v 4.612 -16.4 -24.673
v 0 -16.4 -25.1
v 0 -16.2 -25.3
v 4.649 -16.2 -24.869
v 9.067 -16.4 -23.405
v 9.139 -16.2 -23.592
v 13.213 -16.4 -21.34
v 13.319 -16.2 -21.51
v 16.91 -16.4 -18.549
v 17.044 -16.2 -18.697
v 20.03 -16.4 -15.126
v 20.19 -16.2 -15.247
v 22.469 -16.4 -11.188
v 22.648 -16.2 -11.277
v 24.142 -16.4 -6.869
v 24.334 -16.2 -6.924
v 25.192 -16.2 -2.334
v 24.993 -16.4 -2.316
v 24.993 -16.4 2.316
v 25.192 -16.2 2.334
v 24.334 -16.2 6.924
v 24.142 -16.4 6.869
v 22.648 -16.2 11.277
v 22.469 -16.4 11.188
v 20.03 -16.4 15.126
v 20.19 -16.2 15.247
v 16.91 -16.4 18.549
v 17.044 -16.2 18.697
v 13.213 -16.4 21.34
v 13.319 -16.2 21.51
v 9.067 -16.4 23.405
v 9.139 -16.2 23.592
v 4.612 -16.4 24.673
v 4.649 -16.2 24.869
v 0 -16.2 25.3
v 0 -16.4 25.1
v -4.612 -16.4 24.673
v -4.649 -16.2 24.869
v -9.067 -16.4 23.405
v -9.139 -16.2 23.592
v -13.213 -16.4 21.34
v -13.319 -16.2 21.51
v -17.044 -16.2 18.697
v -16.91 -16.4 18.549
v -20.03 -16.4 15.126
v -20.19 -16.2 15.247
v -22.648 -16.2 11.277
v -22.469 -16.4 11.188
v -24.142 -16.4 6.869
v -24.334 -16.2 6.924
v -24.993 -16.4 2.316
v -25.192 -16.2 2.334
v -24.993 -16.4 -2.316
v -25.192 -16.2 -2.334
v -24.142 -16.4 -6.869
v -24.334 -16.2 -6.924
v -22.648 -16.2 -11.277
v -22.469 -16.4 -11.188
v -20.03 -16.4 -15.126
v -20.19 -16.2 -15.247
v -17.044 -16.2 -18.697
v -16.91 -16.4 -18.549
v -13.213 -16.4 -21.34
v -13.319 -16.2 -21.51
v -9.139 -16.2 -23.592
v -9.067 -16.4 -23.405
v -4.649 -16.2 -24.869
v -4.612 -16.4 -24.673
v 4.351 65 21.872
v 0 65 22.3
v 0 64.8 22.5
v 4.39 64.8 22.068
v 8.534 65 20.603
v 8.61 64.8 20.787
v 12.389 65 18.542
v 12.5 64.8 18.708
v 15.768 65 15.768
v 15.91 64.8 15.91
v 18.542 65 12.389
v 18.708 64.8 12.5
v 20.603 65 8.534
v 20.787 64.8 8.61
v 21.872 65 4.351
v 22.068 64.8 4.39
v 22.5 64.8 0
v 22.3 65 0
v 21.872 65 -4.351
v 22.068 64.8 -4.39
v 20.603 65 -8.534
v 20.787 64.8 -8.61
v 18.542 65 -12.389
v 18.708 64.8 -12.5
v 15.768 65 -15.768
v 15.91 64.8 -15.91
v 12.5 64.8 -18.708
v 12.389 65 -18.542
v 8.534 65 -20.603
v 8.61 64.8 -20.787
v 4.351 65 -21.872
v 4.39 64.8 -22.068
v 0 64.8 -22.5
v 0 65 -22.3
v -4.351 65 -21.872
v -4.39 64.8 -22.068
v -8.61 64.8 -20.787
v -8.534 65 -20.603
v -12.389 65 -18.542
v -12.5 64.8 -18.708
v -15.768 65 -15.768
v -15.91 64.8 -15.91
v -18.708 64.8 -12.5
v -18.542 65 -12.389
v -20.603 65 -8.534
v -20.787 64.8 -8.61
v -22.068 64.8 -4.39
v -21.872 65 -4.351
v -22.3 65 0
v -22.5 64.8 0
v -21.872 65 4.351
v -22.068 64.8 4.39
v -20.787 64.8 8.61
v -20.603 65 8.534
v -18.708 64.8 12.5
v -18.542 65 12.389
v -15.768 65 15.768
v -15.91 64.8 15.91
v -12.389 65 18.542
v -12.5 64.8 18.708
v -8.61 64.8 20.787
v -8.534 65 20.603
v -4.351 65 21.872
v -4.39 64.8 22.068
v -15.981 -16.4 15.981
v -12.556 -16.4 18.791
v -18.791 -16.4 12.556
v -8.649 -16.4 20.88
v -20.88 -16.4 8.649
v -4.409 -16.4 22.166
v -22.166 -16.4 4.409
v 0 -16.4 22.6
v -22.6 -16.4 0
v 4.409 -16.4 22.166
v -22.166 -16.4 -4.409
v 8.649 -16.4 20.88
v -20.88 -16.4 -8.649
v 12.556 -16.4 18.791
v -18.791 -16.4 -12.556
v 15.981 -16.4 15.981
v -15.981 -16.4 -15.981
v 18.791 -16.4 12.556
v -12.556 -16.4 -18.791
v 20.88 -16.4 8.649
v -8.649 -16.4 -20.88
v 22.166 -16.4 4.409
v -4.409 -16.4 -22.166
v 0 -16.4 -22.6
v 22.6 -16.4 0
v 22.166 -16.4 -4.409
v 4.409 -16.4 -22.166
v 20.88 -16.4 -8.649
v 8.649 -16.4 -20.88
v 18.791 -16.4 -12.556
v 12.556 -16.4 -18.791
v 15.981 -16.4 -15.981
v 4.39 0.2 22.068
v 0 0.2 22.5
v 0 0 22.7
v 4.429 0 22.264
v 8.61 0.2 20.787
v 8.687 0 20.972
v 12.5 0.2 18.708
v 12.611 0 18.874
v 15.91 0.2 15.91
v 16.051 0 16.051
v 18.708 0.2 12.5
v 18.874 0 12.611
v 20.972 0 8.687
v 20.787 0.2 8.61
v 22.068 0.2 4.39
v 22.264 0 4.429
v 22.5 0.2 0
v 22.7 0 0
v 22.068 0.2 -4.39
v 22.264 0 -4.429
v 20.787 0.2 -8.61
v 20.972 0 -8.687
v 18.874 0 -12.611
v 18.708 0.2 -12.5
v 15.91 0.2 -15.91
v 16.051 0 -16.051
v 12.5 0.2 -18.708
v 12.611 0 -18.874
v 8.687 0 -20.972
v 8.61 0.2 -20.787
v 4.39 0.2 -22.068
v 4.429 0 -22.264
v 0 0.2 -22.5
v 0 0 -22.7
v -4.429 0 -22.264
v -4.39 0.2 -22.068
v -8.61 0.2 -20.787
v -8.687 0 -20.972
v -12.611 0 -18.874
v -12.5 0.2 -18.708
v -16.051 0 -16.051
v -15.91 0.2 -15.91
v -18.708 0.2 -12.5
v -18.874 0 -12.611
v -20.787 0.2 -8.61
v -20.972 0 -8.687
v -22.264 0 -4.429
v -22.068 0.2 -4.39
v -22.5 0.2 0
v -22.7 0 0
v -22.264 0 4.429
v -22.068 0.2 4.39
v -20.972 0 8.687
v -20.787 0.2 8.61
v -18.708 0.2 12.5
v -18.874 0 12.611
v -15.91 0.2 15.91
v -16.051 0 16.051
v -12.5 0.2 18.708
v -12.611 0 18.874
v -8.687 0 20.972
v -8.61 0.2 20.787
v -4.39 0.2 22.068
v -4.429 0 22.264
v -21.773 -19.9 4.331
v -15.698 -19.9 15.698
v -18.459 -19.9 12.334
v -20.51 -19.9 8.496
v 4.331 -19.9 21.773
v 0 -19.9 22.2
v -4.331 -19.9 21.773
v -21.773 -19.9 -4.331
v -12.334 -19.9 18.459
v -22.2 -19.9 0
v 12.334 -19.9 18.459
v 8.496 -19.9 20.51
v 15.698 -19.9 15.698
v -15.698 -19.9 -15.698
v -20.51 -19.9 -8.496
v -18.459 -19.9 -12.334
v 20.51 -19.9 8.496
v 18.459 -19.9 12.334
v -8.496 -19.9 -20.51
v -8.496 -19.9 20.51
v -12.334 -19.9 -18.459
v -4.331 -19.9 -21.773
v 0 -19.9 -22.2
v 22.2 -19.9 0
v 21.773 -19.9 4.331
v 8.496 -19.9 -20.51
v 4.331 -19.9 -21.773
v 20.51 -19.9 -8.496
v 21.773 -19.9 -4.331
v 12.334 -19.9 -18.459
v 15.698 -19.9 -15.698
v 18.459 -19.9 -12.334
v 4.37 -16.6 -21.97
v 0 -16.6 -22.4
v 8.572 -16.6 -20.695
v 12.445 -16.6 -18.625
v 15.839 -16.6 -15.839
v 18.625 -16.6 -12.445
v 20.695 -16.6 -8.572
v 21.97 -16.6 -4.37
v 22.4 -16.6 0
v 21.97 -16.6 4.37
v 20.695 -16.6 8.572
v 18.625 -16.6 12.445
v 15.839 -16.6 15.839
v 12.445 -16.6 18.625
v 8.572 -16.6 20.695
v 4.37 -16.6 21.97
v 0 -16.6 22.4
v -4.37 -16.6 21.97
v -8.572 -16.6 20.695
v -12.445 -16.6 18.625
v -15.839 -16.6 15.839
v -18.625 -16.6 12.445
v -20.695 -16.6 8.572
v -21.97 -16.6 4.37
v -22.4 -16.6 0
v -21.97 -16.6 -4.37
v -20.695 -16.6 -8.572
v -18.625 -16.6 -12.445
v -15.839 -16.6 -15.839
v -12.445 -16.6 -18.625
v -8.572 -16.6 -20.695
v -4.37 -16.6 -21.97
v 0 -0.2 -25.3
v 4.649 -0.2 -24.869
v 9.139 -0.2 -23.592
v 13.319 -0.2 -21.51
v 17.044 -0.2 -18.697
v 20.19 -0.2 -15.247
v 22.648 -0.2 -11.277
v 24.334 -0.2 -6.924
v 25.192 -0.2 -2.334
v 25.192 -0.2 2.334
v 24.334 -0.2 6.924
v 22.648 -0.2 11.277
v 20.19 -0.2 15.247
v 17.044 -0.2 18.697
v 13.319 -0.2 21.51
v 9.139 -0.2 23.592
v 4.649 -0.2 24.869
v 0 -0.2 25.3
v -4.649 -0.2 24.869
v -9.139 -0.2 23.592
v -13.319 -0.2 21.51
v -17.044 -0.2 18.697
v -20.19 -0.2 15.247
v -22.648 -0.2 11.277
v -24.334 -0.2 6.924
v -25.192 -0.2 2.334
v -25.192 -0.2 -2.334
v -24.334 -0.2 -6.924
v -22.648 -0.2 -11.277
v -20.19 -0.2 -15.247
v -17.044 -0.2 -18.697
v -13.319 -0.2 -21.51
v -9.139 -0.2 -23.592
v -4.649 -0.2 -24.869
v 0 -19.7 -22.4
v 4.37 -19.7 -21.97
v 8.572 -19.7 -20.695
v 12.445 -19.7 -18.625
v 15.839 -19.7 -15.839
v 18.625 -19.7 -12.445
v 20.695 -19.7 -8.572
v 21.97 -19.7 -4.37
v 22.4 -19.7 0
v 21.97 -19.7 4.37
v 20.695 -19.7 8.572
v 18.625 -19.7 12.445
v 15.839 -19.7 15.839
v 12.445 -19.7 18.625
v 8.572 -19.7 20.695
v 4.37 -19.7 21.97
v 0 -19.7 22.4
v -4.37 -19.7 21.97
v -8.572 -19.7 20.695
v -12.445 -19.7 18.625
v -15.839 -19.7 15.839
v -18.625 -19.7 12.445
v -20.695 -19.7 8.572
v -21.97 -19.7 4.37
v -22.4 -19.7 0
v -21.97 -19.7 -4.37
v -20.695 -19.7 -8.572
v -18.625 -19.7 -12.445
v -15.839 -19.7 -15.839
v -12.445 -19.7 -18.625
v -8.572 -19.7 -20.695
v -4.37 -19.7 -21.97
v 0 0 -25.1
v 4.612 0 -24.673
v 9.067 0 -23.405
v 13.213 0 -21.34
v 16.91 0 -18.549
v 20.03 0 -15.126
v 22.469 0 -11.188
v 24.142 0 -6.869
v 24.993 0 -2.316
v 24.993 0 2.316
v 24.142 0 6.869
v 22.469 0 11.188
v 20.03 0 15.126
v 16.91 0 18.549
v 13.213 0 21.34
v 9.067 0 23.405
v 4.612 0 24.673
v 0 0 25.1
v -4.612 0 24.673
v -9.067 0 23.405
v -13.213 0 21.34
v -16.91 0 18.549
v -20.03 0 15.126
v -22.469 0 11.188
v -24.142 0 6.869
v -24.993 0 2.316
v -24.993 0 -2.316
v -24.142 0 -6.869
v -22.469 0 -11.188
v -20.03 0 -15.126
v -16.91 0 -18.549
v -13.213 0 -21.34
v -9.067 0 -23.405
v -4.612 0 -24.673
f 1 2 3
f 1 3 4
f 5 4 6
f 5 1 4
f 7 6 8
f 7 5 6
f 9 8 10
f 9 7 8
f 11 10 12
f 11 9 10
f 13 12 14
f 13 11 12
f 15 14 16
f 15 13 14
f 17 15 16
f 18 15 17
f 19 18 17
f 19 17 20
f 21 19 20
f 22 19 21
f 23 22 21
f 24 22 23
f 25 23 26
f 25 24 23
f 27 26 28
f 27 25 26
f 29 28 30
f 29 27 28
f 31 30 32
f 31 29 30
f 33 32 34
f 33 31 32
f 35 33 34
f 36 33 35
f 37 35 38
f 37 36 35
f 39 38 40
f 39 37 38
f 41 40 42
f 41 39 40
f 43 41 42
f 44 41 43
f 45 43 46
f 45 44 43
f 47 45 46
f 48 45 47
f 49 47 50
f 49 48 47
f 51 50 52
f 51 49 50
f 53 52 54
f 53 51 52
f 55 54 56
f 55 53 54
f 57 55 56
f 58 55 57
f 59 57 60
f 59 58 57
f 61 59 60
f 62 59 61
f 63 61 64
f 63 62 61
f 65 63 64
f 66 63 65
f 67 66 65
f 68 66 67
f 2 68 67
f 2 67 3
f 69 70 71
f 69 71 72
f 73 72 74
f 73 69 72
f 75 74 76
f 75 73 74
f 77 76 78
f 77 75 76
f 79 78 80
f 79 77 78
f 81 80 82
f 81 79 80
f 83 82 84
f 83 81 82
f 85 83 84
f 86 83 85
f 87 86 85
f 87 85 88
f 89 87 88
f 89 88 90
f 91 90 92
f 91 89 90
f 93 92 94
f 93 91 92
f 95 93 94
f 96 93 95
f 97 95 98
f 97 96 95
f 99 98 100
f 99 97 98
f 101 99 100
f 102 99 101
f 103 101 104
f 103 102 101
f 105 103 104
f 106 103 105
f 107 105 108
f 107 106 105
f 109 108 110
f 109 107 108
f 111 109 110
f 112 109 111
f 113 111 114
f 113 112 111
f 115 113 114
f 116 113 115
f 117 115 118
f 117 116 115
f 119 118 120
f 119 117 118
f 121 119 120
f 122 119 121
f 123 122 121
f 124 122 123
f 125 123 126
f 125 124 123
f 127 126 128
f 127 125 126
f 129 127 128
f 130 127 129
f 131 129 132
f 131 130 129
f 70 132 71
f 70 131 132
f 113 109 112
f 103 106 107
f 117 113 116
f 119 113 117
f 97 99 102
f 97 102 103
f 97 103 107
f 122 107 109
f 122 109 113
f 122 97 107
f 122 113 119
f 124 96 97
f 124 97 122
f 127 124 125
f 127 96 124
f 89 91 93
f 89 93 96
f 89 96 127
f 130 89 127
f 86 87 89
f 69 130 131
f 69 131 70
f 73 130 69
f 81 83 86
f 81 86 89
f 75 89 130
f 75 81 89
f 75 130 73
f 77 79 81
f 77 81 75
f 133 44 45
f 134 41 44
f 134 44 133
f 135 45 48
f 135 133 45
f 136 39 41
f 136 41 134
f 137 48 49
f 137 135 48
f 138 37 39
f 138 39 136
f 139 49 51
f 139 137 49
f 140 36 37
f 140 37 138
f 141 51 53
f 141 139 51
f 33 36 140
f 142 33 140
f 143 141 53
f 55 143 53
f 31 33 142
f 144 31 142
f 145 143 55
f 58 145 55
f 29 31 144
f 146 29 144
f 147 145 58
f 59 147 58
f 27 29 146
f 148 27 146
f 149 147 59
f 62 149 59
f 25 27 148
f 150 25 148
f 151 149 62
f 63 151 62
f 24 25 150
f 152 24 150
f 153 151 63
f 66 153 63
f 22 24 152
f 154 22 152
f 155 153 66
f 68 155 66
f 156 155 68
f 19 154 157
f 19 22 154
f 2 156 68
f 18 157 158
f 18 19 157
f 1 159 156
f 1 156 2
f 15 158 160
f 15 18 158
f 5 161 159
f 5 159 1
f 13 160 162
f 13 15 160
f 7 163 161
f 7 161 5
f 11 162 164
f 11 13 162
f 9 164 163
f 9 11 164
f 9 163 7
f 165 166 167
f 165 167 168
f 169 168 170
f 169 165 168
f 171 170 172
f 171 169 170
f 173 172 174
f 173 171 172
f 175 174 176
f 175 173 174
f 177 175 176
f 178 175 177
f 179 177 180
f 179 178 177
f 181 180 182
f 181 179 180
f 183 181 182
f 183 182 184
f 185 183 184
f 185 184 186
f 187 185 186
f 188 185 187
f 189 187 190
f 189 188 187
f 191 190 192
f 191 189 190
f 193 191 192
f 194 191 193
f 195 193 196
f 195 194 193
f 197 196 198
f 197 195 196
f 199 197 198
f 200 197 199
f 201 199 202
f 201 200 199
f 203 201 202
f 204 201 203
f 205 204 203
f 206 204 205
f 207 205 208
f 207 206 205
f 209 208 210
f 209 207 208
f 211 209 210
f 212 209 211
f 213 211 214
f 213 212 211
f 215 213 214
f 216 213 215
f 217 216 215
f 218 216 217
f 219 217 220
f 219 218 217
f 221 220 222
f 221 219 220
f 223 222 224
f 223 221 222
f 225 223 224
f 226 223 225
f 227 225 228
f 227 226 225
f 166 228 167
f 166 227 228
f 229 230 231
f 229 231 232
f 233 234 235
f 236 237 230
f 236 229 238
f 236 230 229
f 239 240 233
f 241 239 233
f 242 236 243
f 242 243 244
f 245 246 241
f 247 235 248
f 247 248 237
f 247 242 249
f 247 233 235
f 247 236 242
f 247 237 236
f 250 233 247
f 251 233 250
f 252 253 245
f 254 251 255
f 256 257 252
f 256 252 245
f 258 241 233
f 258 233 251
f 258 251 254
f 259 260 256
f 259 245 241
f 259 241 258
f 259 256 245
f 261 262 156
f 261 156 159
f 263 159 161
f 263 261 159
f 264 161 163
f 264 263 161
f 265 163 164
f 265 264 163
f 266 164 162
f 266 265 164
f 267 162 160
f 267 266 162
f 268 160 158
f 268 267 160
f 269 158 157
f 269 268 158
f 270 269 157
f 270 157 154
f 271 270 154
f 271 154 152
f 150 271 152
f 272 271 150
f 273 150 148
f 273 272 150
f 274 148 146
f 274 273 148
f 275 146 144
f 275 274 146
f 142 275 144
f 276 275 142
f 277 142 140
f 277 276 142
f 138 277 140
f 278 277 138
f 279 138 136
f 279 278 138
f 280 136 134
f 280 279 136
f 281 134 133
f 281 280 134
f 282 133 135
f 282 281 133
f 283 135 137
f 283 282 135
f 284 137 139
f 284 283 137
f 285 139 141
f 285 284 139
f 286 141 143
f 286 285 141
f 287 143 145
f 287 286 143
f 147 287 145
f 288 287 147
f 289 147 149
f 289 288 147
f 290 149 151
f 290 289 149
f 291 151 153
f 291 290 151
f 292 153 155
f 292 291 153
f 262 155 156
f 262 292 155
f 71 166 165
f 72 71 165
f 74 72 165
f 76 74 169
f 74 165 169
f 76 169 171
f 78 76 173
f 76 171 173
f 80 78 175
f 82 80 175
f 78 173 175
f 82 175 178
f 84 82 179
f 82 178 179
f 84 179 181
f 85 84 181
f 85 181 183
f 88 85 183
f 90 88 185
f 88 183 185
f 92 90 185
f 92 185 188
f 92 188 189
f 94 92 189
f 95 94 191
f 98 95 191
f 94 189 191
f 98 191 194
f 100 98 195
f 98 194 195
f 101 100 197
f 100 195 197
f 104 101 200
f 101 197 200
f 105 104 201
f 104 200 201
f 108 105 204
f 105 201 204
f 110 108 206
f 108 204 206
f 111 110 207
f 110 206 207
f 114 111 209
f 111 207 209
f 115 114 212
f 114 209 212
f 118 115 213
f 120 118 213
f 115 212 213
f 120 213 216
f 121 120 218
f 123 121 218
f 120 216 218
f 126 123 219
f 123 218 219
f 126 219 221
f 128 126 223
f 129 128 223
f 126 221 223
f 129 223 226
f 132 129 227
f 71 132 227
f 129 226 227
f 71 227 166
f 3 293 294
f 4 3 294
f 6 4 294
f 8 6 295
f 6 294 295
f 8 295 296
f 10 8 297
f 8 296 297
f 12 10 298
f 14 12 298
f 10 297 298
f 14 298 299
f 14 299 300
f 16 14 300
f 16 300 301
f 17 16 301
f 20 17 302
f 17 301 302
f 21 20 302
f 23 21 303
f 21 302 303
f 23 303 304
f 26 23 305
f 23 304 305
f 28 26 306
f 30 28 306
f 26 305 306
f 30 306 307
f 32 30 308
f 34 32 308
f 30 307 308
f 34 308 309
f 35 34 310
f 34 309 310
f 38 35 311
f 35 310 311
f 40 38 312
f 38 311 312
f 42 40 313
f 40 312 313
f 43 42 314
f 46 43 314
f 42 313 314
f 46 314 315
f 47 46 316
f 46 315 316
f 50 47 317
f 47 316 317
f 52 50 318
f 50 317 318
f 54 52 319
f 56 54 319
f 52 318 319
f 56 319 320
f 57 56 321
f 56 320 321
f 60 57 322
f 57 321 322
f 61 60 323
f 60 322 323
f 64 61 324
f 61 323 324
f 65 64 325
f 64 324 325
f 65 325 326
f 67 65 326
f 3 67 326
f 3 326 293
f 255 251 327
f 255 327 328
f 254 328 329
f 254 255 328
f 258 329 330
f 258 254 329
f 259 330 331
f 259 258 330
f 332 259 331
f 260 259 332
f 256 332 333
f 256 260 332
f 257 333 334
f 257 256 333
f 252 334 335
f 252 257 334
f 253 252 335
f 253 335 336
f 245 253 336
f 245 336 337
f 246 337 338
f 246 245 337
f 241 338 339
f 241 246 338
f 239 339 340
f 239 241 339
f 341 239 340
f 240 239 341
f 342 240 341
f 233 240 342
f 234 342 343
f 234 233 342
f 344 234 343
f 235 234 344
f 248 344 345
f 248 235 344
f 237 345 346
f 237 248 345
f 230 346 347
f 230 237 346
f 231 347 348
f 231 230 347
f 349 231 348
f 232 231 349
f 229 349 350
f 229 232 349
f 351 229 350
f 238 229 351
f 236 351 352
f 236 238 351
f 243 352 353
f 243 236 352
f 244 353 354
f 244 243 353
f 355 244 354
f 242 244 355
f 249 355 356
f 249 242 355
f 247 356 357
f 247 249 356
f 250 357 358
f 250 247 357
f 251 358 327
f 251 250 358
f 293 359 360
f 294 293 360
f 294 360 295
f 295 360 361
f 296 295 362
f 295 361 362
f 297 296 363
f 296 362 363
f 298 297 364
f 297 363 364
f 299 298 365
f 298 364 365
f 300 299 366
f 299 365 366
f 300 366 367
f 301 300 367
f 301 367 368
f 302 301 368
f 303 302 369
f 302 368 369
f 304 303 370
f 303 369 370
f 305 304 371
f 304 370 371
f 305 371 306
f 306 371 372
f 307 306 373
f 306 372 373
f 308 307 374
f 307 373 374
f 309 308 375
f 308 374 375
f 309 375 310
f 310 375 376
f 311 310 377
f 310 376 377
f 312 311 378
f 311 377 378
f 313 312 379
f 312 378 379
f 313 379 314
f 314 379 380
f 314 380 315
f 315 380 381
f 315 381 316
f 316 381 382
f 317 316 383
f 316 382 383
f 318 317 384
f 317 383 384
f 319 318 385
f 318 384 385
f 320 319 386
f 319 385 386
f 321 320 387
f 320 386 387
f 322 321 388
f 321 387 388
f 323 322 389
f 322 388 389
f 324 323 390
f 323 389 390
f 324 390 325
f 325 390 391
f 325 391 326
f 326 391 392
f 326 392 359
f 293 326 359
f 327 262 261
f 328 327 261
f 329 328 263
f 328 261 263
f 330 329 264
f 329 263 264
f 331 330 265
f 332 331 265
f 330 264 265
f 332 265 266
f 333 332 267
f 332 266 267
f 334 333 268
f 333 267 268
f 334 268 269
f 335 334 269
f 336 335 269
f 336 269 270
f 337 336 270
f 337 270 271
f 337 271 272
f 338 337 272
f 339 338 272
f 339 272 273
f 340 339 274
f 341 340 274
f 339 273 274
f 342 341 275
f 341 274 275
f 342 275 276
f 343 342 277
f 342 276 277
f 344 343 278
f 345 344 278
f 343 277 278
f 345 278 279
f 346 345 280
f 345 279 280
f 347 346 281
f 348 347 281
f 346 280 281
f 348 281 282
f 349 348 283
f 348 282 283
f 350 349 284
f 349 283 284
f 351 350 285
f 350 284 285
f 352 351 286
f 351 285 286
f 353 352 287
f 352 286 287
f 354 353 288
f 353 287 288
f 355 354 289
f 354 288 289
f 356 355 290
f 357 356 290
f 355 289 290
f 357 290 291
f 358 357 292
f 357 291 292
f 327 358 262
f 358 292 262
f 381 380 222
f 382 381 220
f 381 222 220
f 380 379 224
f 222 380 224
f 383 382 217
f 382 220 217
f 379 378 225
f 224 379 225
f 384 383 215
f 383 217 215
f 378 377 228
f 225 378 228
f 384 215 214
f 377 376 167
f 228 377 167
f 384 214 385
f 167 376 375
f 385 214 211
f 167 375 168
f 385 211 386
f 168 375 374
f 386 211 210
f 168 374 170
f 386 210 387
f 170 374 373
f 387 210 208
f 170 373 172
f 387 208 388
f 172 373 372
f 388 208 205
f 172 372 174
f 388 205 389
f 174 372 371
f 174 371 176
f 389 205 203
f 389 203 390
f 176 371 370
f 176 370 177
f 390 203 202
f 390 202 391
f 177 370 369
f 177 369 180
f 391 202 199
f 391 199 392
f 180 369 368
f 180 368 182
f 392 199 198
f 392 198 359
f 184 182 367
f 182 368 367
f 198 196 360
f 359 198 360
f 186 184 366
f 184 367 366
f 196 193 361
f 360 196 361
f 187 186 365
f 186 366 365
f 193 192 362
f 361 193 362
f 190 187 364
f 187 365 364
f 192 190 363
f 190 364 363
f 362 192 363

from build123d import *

# Parameters (mm, degrees)
SKETCH1_R           = 22.5
BOSS_EXTRUDE1_DEPTH = 65
SKETCH2_R           = 25.3
BOSS_EXTRUDE2_DEPTH = 16.4
SKETCH3_R           = 22.4
BOSS_EXTRUDE3_DEPTH = 3.5
CHAMFER1_SIZE       = 0.2


with BuildPart() as part:
    # Sketch1 → Boss-Extrude1 (new body)
    with BuildSketch(Plane(origin=(0, 0, 0), x_dir=(1, 0, 0), z_dir=(0, 1, 0))):
        with Locations(Location((0, 0, 0), (0, 0, 270))):
            Circle(SKETCH1_R)
    extrude(amount=BOSS_EXTRUDE1_DEPTH)

    # Sketch2 → Boss-Extrude2 (add)
    with BuildSketch(Plane.XZ):
        with Locations(Location((0, 0, 0), (0, 0, 270))):
            Circle(SKETCH2_R)
    extrude(amount=BOSS_EXTRUDE2_DEPTH)

    # Sketch3 → Boss-Extrude3 (add)
    with BuildSketch(Plane.XZ.offset(16.4)):
        with Locations(Location((0, 0, 0), (0, 0, 270))):
            Circle(SKETCH3_R)
    extrude(amount=BOSS_EXTRUDE3_DEPTH)

    # Chamfer1
    chamfer1_edges = [part.edges().sort_by_distance(p)[0] for p in [
        (0, -19.9, 22.4),
        (0, 65, -22.5),
        (0, 0, -22.5),
        (0, 0, 25.3),
        (0, -16.4, 25.3),
        (0, -16.4, 22.4),
    ]]
    chamfer(chamfer1_edges, length=CHAMFER1_SIZE)


solid = part.part
